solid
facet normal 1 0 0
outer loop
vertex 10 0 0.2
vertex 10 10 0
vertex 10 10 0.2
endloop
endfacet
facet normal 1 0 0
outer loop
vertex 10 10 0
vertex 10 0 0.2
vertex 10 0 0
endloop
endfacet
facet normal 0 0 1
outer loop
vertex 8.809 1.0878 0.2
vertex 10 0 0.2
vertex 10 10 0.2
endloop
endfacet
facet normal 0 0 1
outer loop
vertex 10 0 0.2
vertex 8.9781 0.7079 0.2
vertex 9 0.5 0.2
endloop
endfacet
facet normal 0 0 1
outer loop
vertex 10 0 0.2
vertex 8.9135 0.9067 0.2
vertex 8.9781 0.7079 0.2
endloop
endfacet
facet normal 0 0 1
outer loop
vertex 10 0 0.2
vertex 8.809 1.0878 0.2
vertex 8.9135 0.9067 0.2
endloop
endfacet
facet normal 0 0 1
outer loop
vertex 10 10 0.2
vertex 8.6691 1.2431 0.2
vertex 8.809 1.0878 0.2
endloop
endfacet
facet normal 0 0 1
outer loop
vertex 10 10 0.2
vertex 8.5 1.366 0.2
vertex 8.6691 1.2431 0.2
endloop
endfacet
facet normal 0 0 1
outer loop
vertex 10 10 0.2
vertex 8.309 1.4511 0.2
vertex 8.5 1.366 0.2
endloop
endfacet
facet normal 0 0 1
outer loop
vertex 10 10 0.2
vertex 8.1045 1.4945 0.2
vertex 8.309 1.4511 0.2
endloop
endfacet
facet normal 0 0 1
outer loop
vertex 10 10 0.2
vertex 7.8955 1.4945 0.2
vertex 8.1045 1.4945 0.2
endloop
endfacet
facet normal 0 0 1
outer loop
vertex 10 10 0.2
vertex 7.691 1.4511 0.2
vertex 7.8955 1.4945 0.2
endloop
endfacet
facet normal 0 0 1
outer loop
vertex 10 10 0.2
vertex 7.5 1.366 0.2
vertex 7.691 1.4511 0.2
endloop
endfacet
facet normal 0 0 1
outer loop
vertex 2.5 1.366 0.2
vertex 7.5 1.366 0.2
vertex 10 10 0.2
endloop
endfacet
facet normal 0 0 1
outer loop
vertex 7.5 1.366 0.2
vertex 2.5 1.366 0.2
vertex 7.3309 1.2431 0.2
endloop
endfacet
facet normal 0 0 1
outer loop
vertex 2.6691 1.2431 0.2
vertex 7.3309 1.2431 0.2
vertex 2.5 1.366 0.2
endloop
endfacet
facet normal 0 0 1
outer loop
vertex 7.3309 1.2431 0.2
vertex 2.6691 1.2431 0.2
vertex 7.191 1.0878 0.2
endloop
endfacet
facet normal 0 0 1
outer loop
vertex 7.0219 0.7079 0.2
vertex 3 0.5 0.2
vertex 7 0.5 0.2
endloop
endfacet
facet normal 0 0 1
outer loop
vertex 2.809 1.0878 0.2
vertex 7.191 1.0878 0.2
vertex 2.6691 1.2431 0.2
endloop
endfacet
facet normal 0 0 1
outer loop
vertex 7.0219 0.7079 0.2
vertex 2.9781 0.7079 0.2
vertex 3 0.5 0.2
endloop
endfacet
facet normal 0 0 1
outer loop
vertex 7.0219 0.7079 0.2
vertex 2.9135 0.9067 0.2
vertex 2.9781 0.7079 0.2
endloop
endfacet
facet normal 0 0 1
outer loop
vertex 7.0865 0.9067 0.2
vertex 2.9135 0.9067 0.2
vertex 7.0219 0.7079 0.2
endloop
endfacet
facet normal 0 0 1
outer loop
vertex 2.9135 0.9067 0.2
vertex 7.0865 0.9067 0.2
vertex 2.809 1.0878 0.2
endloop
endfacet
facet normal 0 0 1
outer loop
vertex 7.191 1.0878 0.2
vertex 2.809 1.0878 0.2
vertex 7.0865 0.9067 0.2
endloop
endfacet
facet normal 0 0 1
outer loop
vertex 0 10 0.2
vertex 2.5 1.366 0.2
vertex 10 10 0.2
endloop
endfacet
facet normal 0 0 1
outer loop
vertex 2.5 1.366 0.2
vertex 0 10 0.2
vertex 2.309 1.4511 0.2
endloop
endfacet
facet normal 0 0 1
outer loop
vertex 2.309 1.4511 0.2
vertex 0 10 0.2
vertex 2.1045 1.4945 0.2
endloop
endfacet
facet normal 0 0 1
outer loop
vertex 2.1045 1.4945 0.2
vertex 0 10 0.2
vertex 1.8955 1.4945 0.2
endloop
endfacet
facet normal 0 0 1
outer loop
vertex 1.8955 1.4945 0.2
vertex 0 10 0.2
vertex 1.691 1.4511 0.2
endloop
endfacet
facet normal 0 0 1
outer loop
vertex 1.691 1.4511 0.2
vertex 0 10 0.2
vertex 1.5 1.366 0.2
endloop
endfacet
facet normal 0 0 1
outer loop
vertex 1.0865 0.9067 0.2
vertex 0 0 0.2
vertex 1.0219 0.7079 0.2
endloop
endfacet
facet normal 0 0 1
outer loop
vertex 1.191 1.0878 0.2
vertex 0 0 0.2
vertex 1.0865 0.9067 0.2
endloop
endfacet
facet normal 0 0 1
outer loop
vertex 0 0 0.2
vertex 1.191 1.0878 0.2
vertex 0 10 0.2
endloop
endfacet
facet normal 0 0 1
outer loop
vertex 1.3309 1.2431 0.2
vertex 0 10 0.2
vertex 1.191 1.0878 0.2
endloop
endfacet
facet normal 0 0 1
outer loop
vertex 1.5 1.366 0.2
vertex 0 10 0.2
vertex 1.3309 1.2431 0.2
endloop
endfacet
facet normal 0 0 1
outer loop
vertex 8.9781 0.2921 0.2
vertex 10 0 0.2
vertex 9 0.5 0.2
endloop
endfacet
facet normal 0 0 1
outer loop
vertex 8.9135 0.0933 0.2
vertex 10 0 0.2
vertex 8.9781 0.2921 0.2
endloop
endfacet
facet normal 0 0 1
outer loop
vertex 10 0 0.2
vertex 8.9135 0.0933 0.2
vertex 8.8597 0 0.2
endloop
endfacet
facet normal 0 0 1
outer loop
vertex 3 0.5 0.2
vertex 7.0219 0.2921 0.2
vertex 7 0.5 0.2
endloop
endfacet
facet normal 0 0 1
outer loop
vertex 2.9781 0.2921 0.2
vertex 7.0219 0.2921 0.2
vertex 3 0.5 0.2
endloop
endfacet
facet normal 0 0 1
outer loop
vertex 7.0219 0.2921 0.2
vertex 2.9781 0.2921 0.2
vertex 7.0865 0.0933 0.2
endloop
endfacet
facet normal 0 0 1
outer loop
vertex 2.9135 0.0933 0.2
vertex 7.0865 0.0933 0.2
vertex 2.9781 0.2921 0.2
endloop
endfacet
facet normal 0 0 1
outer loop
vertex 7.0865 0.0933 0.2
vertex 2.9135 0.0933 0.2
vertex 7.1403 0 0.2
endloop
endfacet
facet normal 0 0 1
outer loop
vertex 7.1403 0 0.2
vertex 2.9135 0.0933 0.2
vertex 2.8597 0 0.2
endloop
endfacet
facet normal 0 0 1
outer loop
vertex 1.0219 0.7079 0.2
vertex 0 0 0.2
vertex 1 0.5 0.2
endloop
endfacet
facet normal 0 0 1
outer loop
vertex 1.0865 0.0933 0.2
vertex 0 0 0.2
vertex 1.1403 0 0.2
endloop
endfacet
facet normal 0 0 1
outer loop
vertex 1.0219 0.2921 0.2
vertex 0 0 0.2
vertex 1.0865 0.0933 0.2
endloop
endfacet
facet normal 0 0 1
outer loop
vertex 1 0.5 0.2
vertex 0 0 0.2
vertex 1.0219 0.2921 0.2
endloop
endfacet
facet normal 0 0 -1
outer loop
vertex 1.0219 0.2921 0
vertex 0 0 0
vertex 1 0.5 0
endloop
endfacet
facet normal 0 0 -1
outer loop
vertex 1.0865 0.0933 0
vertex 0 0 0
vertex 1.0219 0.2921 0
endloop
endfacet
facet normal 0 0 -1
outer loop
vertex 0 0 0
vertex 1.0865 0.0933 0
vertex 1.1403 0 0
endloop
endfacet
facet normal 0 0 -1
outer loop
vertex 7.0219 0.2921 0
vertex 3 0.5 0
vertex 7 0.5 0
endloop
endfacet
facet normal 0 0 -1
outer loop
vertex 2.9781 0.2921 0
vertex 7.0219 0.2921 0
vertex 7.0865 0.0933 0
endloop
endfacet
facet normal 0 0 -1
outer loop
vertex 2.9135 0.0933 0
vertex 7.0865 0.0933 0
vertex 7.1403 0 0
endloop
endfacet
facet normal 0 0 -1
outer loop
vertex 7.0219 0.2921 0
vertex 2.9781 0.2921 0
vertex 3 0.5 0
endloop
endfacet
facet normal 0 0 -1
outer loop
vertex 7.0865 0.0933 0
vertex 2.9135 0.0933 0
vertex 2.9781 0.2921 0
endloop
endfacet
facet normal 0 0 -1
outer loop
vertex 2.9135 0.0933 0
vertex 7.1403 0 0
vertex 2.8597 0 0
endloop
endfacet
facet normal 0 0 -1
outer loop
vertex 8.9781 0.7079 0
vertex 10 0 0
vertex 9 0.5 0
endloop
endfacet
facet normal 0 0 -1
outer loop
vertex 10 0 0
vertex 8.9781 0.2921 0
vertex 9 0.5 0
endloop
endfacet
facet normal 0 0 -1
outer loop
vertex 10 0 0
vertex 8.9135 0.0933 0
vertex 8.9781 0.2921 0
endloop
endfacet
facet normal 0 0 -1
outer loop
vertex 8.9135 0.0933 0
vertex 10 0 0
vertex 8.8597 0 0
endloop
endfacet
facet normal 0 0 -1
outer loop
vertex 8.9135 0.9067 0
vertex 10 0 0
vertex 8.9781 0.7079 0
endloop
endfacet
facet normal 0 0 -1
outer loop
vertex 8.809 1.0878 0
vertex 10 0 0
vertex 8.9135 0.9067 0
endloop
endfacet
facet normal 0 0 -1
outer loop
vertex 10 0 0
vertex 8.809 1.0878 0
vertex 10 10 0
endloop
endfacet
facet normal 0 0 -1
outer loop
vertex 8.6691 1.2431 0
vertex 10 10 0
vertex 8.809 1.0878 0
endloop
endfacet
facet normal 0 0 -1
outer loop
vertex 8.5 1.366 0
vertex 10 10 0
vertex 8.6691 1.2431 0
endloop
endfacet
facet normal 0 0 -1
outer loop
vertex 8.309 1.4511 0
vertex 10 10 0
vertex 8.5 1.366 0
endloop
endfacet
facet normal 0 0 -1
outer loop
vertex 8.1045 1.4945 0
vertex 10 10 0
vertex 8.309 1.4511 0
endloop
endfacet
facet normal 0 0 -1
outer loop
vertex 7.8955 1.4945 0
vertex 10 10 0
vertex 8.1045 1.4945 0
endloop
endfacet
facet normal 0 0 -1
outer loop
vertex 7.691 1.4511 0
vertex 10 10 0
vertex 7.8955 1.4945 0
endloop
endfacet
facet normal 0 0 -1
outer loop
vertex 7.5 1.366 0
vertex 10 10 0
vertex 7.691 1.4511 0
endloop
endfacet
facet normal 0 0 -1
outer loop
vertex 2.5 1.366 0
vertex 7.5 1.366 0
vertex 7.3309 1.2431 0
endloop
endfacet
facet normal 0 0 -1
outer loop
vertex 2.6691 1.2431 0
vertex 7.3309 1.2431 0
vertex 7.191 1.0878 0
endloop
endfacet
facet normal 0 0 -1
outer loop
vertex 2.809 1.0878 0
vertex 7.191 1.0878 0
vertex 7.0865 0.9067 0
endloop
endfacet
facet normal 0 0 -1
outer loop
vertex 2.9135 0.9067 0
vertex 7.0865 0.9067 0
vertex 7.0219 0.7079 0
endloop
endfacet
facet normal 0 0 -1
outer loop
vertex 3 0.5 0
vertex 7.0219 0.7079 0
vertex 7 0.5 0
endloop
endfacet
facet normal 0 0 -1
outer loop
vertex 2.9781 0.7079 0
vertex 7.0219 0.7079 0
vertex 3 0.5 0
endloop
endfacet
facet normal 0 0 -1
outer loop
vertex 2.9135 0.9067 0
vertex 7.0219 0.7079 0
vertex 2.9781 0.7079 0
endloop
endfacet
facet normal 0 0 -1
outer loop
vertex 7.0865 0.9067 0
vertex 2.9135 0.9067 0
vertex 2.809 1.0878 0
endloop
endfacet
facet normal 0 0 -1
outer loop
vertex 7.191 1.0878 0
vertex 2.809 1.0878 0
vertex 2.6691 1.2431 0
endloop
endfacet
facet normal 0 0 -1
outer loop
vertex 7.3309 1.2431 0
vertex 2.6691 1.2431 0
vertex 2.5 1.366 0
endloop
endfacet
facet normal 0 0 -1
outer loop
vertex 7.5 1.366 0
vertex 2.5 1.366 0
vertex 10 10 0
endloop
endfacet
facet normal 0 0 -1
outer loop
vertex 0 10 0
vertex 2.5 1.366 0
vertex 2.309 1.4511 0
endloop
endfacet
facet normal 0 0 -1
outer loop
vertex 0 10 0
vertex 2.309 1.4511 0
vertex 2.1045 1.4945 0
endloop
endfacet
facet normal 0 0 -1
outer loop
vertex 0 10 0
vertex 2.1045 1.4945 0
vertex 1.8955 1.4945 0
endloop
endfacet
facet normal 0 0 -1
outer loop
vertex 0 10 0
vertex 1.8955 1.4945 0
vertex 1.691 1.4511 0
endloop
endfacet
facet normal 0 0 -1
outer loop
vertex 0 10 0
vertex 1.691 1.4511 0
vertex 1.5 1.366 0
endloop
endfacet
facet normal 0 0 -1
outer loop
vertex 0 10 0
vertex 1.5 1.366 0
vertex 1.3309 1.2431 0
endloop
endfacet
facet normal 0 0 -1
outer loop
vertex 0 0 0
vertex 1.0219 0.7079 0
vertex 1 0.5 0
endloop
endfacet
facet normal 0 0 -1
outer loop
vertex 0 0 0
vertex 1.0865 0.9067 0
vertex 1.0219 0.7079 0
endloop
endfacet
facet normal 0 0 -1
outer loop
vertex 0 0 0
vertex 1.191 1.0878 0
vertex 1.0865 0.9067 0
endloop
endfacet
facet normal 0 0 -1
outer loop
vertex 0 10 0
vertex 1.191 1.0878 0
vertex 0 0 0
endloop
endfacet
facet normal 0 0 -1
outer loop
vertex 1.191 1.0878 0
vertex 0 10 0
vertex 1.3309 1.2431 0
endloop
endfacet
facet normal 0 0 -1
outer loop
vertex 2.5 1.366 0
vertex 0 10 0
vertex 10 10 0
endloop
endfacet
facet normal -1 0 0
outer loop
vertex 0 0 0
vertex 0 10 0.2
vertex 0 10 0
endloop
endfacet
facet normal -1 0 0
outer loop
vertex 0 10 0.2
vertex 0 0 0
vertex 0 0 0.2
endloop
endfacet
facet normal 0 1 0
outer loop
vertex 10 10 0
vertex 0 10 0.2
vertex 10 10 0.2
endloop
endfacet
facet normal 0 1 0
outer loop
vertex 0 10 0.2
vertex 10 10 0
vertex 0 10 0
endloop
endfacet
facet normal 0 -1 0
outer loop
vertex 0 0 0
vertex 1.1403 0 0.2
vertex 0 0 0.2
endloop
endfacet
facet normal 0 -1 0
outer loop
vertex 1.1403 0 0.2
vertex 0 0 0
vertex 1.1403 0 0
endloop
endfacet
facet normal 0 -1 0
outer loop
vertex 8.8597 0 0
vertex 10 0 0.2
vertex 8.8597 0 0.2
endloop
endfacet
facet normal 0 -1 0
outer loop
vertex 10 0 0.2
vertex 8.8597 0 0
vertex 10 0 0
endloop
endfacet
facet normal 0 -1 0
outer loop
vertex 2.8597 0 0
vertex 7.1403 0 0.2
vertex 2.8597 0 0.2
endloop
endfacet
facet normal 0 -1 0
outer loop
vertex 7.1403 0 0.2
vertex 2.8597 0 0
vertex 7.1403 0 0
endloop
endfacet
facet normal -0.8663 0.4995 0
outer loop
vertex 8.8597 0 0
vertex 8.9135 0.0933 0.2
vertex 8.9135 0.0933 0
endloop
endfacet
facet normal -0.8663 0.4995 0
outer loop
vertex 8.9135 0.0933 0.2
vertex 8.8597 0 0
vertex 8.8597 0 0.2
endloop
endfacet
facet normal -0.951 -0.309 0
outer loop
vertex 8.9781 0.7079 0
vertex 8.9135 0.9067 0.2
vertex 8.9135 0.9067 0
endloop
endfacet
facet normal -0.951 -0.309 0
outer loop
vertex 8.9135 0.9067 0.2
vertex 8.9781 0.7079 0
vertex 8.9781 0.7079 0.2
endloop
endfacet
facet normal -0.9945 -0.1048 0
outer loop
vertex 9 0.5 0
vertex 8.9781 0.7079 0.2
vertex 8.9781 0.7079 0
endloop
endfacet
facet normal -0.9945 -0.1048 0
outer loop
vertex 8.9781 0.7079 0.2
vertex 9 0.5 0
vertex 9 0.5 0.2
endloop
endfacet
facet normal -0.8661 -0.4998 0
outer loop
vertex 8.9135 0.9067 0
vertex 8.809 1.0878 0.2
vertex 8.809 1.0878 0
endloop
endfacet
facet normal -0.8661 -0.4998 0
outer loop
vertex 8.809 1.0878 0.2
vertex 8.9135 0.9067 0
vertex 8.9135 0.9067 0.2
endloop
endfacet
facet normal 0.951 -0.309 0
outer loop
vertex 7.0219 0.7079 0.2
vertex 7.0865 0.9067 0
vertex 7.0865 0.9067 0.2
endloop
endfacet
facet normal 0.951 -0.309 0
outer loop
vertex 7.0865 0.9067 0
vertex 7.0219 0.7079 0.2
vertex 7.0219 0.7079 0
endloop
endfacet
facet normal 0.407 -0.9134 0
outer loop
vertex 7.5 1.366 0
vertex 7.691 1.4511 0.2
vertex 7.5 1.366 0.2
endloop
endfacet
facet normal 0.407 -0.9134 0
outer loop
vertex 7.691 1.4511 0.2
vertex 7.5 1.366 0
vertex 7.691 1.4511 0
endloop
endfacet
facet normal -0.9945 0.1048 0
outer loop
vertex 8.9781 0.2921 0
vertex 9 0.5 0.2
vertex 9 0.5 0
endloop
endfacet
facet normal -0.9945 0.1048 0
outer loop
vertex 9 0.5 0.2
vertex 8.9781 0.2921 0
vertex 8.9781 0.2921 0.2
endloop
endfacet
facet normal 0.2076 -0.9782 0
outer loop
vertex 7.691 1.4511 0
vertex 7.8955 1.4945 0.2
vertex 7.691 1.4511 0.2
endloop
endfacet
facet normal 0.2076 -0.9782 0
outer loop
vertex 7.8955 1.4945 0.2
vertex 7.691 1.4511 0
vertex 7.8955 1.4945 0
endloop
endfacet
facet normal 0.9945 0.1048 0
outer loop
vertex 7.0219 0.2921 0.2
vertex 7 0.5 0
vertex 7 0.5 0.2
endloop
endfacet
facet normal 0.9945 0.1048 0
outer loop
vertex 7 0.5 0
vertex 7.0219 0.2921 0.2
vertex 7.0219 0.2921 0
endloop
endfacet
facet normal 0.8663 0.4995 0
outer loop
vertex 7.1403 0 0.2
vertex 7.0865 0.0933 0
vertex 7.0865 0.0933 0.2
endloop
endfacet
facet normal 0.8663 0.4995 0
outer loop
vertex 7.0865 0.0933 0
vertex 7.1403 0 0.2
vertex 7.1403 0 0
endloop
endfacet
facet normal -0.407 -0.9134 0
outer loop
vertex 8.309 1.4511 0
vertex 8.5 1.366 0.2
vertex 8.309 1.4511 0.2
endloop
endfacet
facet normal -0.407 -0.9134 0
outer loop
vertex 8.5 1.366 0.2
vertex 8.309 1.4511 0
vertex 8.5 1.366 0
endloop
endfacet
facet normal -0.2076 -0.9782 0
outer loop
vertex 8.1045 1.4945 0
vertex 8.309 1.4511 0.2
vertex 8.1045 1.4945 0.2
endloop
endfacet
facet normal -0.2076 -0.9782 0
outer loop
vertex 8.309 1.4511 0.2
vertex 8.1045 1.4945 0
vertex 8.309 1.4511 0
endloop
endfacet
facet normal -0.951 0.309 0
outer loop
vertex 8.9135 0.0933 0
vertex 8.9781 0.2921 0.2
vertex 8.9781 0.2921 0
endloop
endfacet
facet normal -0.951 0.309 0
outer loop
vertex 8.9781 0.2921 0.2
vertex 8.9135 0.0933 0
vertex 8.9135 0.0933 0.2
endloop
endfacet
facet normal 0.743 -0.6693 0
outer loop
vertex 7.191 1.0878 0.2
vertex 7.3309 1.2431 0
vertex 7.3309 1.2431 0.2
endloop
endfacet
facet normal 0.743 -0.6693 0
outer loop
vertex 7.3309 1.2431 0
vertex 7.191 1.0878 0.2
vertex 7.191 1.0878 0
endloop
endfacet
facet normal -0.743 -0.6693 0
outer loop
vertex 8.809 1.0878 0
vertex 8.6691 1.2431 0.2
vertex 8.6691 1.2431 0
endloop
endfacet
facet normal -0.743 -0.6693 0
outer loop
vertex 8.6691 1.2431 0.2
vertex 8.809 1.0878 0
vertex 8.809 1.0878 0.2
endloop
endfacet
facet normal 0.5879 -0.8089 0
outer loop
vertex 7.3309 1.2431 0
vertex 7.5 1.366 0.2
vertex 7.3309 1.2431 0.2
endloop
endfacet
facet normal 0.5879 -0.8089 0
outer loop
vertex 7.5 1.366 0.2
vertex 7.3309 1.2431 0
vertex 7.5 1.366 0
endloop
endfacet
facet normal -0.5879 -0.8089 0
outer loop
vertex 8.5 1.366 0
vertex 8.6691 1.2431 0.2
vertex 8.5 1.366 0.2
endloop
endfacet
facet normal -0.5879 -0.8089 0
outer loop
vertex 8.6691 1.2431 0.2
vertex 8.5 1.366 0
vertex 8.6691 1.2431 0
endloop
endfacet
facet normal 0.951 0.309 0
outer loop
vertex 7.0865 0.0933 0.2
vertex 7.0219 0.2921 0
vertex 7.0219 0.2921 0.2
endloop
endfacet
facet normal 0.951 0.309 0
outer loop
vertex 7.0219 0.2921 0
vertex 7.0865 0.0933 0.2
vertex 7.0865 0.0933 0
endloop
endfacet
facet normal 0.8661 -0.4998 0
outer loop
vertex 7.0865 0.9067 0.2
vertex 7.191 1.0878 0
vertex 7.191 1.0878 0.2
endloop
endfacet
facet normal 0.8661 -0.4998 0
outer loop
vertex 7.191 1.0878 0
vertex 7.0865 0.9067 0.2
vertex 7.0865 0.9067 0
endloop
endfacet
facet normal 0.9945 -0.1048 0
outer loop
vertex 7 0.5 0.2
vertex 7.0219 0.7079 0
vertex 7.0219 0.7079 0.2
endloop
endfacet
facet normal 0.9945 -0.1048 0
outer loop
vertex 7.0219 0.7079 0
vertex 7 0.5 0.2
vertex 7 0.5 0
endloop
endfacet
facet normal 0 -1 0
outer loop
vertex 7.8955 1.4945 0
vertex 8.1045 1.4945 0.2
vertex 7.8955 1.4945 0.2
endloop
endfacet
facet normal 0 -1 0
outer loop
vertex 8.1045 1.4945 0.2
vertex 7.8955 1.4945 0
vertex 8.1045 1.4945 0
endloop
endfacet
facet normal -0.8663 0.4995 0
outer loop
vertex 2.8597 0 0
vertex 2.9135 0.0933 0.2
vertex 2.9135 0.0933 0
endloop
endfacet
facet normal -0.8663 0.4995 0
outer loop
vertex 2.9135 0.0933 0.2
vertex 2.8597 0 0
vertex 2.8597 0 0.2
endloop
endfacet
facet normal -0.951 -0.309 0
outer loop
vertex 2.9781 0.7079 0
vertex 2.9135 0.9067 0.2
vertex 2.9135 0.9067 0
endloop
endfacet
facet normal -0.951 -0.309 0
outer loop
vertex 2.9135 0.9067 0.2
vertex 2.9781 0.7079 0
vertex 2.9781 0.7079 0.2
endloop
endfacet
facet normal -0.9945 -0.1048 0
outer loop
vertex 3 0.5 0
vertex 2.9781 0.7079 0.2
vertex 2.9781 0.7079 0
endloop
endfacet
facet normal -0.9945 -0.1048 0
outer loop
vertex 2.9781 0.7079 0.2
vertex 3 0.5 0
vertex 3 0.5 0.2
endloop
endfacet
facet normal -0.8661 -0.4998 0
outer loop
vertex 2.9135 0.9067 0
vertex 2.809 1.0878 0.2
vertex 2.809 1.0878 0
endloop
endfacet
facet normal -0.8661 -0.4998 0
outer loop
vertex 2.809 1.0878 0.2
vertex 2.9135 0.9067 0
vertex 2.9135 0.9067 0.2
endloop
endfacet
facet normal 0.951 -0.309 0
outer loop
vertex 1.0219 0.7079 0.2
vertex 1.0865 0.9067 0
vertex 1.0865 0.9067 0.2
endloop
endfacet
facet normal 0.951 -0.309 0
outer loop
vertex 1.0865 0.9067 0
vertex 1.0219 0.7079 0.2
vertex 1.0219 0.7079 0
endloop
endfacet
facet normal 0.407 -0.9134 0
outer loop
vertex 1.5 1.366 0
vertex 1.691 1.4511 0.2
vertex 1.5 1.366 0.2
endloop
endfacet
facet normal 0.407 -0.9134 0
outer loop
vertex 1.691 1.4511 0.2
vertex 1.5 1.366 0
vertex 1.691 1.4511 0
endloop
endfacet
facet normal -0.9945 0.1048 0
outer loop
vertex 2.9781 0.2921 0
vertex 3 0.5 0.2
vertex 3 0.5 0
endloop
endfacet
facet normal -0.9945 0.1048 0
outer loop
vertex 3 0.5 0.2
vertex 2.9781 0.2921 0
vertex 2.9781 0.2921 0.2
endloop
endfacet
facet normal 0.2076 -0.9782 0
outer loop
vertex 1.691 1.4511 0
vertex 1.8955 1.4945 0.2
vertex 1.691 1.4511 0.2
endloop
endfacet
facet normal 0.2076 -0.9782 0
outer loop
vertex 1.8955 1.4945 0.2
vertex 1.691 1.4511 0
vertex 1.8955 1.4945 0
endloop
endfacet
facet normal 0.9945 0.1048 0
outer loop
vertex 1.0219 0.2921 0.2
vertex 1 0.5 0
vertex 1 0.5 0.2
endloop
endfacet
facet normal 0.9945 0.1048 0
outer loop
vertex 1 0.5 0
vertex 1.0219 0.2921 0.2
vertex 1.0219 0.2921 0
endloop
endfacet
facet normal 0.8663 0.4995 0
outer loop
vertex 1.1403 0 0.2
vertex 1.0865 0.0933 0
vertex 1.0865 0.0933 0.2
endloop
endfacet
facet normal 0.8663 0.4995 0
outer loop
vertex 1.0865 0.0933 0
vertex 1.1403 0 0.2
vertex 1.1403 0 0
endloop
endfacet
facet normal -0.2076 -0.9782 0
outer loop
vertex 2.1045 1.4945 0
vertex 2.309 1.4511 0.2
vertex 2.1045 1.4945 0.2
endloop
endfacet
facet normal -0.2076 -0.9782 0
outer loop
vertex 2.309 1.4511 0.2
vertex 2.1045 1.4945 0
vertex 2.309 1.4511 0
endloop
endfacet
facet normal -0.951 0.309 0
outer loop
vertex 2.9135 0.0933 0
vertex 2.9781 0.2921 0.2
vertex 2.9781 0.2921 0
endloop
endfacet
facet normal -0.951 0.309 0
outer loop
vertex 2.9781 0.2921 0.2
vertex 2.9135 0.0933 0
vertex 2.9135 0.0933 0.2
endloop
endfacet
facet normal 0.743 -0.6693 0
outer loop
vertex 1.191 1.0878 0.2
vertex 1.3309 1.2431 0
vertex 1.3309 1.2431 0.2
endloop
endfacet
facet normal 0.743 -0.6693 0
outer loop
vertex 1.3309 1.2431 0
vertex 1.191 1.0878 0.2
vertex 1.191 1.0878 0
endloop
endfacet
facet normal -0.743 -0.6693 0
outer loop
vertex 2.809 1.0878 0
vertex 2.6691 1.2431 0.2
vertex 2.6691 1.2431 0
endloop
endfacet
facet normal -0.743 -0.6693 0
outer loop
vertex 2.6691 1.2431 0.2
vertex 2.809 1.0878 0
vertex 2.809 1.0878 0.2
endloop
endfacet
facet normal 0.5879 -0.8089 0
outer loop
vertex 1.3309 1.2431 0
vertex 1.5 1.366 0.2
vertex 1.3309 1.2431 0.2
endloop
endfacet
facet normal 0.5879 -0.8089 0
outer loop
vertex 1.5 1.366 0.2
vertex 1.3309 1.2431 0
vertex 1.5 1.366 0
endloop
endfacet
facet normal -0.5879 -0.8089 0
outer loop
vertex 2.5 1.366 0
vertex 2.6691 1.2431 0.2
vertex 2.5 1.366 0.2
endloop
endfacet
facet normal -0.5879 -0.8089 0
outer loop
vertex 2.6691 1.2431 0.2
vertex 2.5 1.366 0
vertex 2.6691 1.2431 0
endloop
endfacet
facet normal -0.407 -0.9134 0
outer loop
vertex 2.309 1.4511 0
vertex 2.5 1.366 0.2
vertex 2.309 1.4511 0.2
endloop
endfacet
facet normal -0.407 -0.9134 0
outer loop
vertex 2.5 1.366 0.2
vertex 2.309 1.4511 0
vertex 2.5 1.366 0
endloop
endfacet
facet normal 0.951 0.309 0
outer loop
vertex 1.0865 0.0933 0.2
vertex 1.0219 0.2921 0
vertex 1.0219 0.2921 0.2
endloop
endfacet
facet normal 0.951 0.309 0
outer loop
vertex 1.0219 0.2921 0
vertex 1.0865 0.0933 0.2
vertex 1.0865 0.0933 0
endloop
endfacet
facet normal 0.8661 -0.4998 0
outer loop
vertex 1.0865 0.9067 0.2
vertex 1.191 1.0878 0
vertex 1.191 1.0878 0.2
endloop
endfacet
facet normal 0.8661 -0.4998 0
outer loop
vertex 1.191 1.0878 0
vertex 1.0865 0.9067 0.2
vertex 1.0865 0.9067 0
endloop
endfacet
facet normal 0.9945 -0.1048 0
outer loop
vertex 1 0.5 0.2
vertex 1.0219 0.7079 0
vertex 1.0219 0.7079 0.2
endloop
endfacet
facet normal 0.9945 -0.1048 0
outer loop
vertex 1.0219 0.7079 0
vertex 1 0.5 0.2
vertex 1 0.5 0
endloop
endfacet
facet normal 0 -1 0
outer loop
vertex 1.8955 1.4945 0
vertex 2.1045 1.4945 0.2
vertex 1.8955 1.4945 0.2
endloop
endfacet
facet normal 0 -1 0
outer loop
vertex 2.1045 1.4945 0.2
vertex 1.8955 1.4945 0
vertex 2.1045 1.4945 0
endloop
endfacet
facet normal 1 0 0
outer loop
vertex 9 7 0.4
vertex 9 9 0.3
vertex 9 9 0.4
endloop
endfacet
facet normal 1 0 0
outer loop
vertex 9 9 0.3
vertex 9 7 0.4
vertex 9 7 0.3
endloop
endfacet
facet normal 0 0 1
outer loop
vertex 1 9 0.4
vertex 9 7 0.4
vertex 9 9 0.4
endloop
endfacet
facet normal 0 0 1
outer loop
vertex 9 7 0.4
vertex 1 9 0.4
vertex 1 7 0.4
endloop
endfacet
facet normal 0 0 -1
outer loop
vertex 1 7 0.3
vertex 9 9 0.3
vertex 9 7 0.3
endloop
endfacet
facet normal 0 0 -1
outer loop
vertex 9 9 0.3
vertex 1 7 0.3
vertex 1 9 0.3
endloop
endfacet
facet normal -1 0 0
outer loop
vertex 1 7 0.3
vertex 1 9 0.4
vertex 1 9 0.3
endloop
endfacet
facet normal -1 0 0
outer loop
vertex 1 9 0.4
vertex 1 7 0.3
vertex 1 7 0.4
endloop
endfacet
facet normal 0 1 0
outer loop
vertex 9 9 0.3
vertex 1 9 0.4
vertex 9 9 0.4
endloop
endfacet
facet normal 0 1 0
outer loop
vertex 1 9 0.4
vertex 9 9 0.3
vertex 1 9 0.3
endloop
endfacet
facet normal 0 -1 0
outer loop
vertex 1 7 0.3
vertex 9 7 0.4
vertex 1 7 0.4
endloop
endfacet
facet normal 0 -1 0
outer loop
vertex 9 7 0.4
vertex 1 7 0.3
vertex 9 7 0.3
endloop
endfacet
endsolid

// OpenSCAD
//頭
x=10;
y=10;
z=0.2;
h=1;
r=1;
$fs = 0.01;

difference(){
cube([x, y, z]);
    translate([8, 0.5, -0.5])
    cylinder(h,r,center=false);
    translate([2, 0.5, -0.5])
    cylinder(h,r, center=false);
}
translate([1,7,z+0.1])
color("black")cube([8,2,0.1]);
